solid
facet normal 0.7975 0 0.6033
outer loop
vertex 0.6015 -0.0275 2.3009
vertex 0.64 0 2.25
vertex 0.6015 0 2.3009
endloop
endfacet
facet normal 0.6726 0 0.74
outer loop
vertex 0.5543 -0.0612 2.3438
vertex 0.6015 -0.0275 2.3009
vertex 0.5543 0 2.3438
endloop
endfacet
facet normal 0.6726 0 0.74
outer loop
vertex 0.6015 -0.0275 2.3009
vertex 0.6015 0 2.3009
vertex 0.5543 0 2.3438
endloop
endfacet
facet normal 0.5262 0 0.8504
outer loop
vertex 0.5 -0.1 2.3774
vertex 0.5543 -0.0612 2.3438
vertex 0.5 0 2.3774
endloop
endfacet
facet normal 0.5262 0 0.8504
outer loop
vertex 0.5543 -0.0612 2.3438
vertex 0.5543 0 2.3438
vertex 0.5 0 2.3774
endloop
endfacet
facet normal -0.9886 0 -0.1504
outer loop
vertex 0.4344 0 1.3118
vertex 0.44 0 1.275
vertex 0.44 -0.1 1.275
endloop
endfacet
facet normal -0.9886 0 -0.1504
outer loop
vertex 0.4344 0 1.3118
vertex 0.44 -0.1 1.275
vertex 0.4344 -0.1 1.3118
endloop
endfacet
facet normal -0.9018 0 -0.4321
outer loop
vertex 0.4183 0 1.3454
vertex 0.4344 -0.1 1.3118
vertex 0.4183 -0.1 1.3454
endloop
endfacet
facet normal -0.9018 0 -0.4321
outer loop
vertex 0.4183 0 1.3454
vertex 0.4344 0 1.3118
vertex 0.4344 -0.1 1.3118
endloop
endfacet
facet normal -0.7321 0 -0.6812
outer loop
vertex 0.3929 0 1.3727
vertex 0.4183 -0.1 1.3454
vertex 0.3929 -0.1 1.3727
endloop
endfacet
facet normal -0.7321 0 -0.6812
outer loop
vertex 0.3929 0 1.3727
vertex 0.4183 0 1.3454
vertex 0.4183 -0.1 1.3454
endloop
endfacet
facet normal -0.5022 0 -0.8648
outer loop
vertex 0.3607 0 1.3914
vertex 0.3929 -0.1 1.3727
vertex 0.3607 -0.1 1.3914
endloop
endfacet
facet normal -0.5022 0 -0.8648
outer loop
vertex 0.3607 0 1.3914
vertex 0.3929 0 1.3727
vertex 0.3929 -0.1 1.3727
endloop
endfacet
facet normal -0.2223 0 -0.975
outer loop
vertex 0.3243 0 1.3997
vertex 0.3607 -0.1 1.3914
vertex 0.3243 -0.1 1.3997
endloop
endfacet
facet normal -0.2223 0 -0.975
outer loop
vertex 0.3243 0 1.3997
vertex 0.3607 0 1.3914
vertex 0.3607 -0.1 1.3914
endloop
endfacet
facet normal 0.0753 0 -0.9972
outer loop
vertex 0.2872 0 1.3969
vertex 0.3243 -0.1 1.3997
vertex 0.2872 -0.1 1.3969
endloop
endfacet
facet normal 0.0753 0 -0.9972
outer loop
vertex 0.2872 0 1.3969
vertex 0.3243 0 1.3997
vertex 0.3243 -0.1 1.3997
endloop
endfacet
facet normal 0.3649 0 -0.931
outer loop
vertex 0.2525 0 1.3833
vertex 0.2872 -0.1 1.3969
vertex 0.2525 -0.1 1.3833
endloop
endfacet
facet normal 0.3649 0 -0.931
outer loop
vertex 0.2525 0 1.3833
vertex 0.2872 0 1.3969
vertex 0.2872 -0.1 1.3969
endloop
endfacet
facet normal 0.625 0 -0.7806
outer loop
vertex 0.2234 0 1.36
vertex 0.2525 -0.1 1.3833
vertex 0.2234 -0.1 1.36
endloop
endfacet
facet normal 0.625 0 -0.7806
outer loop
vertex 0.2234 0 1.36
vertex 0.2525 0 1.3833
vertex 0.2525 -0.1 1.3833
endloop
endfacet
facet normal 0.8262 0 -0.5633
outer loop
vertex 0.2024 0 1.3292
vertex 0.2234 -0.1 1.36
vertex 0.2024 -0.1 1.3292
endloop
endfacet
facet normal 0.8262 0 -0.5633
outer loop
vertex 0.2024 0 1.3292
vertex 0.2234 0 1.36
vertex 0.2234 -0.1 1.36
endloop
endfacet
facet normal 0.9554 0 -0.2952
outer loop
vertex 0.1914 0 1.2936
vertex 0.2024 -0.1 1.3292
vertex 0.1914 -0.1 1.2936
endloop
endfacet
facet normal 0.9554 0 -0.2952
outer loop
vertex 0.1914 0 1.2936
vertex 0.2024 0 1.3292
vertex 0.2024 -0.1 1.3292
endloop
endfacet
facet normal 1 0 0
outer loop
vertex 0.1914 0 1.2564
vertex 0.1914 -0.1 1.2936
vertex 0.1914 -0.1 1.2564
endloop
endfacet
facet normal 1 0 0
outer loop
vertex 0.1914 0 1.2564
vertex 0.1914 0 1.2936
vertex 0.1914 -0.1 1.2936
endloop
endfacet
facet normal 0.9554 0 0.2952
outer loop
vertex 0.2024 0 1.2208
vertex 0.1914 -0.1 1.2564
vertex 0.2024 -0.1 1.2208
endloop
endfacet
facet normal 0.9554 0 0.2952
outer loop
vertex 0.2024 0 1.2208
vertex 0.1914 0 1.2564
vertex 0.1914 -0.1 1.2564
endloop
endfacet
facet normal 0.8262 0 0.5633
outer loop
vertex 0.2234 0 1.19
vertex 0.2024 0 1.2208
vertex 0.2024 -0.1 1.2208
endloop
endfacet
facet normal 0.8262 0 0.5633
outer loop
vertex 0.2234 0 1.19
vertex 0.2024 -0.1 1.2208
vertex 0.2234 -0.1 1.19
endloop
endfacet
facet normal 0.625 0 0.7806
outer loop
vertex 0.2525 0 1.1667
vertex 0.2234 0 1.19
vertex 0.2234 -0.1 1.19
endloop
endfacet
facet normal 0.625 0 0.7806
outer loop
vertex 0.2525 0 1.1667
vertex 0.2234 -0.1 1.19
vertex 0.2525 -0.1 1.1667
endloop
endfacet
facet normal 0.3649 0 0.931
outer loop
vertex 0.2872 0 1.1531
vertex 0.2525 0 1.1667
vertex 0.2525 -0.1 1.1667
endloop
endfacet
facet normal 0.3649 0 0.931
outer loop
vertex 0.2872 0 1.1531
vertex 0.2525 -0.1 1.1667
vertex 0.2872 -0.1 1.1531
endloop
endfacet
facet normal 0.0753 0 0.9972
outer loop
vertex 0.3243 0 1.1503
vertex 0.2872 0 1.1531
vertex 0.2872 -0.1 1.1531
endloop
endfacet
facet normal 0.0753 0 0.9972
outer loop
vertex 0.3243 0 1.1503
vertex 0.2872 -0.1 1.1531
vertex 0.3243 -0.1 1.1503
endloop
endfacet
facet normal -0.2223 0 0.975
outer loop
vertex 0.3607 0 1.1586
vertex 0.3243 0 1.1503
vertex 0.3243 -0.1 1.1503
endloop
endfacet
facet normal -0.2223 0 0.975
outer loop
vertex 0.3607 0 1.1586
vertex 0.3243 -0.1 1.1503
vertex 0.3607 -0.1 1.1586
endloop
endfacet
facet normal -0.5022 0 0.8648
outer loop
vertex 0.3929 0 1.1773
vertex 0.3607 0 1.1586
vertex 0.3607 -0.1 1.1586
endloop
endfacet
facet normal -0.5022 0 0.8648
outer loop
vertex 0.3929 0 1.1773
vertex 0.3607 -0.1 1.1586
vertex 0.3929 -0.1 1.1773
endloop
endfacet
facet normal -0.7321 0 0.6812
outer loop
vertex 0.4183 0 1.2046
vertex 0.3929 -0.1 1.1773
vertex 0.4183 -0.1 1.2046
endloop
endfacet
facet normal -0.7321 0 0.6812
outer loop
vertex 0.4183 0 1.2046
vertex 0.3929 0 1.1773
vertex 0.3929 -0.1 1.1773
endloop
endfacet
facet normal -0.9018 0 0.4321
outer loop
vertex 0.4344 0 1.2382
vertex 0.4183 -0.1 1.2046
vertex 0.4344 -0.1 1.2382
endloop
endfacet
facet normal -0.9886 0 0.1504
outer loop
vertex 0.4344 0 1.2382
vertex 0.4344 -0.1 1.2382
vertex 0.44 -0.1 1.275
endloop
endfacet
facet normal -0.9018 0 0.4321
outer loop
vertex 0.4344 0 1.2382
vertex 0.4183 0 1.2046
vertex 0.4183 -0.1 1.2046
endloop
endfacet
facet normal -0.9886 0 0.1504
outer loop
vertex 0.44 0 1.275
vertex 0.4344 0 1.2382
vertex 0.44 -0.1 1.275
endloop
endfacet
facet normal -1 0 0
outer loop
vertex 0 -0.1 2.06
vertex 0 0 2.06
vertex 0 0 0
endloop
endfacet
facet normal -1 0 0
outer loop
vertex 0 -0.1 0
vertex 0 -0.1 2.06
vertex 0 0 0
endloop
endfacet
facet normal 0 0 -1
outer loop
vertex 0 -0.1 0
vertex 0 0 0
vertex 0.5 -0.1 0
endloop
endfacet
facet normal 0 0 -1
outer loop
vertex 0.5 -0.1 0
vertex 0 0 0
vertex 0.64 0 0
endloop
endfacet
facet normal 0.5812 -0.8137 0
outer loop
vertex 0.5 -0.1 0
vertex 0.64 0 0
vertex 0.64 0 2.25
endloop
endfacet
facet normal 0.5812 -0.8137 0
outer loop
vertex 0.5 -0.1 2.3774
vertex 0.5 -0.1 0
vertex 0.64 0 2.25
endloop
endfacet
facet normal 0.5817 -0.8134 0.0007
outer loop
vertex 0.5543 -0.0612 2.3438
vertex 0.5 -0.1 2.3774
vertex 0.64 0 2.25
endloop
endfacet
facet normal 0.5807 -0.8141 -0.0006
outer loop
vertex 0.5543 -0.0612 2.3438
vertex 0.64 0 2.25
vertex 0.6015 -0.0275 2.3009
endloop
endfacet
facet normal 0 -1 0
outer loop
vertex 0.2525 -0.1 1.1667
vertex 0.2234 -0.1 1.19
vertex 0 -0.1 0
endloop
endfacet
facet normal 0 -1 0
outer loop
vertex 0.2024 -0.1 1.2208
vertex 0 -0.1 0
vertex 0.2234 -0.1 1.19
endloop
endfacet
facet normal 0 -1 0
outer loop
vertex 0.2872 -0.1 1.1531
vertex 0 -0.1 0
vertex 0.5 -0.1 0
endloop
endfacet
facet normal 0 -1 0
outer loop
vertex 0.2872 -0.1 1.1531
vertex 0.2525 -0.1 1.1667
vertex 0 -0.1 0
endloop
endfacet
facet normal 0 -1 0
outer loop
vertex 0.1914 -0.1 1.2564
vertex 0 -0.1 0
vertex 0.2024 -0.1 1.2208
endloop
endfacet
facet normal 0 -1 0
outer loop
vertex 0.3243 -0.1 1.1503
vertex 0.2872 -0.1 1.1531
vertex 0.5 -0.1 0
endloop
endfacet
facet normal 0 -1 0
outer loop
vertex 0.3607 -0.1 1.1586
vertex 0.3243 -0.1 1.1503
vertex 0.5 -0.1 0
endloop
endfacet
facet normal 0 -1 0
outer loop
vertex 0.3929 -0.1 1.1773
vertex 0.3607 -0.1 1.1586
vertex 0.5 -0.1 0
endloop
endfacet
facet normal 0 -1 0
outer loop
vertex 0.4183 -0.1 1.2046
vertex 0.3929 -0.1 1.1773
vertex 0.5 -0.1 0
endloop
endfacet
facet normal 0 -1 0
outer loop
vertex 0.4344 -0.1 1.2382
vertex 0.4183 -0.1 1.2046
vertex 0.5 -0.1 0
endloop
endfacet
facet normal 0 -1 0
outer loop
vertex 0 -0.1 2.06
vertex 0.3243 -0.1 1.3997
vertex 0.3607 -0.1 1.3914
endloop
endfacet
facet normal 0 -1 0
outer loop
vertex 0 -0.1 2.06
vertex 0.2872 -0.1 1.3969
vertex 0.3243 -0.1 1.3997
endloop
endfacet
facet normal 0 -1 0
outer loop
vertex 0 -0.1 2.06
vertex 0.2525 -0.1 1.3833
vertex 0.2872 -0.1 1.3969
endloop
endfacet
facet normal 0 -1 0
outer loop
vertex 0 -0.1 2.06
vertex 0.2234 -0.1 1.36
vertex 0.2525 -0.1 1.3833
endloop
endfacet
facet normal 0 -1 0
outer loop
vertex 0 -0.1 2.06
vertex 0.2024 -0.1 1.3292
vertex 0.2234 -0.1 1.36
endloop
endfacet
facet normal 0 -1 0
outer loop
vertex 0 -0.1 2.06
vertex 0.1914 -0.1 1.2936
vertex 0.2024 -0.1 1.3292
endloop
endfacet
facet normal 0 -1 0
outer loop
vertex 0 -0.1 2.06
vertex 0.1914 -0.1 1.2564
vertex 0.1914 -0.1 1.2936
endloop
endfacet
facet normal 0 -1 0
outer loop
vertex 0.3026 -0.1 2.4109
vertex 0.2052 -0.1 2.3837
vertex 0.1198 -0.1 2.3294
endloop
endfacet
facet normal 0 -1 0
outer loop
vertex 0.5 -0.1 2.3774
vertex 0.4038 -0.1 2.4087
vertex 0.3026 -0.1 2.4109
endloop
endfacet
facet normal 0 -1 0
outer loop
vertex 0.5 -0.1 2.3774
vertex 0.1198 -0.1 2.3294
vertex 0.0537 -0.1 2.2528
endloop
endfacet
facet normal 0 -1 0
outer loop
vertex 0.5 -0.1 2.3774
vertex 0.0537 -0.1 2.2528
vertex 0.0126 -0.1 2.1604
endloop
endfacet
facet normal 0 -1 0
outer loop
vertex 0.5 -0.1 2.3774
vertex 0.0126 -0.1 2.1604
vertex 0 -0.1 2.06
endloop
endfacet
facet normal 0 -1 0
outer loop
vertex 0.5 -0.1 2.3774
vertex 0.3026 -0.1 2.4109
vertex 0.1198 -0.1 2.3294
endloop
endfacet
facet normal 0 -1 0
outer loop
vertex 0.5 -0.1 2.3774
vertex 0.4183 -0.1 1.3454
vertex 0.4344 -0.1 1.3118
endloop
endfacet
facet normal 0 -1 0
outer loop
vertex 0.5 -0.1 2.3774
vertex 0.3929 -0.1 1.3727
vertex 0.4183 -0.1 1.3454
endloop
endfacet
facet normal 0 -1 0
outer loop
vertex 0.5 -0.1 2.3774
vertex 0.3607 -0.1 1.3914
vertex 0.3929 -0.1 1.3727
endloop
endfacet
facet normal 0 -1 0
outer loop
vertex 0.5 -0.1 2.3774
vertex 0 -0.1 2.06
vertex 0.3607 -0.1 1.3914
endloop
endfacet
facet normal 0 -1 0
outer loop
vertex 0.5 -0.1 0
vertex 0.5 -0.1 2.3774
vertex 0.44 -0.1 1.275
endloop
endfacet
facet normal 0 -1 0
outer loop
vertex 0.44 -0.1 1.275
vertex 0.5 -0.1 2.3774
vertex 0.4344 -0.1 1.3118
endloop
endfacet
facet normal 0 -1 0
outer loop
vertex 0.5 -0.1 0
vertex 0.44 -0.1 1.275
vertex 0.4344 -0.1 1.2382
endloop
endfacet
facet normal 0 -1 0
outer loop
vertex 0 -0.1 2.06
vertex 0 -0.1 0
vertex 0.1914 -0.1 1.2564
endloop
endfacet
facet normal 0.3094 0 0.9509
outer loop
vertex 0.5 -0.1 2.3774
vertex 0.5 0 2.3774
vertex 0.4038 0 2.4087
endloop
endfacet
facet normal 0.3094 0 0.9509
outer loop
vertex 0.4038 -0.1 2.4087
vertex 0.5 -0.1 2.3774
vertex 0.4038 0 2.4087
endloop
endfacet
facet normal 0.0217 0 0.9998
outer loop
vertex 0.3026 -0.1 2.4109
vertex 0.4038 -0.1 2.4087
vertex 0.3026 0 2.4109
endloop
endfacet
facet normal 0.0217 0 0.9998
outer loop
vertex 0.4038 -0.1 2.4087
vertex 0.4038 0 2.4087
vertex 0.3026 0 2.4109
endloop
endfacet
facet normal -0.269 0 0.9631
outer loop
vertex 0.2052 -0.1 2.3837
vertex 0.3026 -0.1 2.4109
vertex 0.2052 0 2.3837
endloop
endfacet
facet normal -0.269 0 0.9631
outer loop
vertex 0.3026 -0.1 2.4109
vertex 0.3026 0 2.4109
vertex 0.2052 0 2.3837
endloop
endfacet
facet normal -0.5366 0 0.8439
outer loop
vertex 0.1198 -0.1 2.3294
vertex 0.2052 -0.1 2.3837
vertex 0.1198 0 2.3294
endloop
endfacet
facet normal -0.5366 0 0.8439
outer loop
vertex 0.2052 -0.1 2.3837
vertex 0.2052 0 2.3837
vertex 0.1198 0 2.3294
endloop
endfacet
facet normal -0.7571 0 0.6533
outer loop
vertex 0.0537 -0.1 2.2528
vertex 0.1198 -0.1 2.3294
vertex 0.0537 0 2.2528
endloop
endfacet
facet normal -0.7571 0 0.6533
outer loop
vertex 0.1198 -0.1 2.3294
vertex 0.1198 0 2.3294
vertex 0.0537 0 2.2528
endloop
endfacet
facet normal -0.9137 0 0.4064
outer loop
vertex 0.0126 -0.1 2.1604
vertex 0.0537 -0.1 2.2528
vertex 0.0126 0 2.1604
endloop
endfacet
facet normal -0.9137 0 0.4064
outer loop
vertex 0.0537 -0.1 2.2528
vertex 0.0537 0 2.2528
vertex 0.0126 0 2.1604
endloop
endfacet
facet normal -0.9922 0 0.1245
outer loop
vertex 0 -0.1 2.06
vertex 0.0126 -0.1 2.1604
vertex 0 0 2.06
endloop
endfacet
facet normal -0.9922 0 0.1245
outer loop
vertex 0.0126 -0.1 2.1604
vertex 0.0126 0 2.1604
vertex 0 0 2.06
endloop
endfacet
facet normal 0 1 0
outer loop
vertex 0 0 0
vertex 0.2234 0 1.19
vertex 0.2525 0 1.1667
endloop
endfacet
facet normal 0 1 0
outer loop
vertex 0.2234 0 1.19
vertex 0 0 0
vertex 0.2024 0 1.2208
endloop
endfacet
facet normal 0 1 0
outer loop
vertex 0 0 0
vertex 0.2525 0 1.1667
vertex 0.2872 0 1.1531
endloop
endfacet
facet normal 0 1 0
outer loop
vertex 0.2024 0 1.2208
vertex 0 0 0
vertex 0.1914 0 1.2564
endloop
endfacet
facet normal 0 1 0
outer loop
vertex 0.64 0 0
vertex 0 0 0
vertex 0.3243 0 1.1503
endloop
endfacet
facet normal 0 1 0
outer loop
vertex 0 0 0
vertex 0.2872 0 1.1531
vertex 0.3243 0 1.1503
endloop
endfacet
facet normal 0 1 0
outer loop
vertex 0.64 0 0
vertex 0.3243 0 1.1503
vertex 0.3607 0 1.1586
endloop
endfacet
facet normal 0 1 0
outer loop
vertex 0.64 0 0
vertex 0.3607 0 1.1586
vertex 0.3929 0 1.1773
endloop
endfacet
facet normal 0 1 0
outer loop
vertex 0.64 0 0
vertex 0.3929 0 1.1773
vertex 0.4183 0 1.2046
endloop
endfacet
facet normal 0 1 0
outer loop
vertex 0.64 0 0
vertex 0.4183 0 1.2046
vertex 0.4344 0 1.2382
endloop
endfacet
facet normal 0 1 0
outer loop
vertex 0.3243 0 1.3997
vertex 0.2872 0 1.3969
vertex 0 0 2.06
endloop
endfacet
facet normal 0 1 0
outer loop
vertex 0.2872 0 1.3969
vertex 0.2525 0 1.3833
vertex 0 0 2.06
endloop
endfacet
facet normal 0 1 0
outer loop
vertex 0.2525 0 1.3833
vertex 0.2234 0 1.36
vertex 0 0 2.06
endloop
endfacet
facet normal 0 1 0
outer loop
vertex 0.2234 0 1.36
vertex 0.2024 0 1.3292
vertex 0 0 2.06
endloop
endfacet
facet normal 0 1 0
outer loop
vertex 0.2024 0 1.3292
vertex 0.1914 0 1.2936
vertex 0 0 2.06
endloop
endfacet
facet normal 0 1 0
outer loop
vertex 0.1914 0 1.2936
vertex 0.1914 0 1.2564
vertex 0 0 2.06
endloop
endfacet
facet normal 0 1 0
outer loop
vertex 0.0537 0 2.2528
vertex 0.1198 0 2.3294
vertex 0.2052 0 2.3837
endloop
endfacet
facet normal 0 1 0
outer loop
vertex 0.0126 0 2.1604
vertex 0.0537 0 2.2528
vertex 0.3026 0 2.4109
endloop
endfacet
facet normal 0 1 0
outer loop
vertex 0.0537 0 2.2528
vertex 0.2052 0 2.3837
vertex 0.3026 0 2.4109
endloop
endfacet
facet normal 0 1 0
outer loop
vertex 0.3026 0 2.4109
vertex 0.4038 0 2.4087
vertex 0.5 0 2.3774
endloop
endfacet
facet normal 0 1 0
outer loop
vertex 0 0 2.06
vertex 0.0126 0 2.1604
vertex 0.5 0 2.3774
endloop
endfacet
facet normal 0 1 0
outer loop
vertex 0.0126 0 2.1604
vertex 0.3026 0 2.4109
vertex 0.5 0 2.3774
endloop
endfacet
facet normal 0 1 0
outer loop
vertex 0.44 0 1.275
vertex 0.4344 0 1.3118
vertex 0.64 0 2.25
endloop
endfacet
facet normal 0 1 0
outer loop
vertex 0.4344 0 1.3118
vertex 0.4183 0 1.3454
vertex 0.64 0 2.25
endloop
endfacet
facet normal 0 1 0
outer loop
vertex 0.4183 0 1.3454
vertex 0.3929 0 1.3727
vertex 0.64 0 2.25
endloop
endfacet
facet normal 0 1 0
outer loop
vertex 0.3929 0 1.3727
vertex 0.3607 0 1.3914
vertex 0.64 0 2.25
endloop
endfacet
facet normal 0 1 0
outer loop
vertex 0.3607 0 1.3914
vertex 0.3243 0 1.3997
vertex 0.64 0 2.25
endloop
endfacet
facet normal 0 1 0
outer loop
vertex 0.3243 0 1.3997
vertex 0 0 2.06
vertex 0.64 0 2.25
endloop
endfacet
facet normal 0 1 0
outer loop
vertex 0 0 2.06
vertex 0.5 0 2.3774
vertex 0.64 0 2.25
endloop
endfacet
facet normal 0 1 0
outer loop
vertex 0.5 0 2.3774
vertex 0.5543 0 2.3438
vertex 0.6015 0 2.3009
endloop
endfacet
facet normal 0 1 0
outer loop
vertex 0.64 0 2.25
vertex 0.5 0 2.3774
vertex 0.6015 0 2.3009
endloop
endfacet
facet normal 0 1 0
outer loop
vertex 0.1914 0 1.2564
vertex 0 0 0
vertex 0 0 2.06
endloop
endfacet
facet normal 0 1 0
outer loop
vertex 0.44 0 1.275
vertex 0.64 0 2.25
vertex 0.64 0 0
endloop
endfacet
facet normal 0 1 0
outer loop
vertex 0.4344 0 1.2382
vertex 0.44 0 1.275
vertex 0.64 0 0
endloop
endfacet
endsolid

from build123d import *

# Parameters (mm, degrees)
F0_R     = 0.125
F1_DEPTH = 0.1
F2_SIZE2 = 0.09999
F2_SIZE  = 0.13999


# Not quite as in the source:
# - a fillet or chamfer is up to 0.001 mm smaller than in the source, because OpenCascade refuses the exact size


with BuildPart() as f1:
    # F0 (on Front) → F1 (new body)
    with BuildSketch(Plane.XZ):
        with BuildLine():
            Line((0, 2.06), (0, 0))
            Line((0, 0), (0.5, 0))
            Line((0.5, 0), (0.5, 2.3774036342))
            ThreePointArc((0.5, 2.3774036342), (0.1605070536, 2.3596783794), (0, 2.06))
        make_face()
        with Locations((0.315, 1.275)):
            Circle(F0_R, mode=Mode.SUBTRACT)
        with BuildLine():
            Line((0.5, 2.3774036342), (0.5, 0))
            Line((0.5, 0), (0.64, 0))
            Line((0.64, 0), (0.64, 2.25))
            ThreePointArc((0.64, 2.25), (0.5788806325, 2.3234604755), (0.5, 2.3774036342))
        make_face()
    extrude(amount=F1_DEPTH)

    # F2 (size 0.14 and 0.1 in the source; OpenCascade refuses exactly that, so slightly less here)
    f2_edges = [f1.edges().sort_by_distance(p)[0] for p in [
        (0.64, -0.1, 1.125),
    ]]
    f2_side = f1.faces().sort_by_distance((0.02497, -0.1, 1.03))[0]
    chamfer(f2_edges, length=F2_SIZE, length2=F2_SIZE2, reference=f2_side)


solid = f1.part
